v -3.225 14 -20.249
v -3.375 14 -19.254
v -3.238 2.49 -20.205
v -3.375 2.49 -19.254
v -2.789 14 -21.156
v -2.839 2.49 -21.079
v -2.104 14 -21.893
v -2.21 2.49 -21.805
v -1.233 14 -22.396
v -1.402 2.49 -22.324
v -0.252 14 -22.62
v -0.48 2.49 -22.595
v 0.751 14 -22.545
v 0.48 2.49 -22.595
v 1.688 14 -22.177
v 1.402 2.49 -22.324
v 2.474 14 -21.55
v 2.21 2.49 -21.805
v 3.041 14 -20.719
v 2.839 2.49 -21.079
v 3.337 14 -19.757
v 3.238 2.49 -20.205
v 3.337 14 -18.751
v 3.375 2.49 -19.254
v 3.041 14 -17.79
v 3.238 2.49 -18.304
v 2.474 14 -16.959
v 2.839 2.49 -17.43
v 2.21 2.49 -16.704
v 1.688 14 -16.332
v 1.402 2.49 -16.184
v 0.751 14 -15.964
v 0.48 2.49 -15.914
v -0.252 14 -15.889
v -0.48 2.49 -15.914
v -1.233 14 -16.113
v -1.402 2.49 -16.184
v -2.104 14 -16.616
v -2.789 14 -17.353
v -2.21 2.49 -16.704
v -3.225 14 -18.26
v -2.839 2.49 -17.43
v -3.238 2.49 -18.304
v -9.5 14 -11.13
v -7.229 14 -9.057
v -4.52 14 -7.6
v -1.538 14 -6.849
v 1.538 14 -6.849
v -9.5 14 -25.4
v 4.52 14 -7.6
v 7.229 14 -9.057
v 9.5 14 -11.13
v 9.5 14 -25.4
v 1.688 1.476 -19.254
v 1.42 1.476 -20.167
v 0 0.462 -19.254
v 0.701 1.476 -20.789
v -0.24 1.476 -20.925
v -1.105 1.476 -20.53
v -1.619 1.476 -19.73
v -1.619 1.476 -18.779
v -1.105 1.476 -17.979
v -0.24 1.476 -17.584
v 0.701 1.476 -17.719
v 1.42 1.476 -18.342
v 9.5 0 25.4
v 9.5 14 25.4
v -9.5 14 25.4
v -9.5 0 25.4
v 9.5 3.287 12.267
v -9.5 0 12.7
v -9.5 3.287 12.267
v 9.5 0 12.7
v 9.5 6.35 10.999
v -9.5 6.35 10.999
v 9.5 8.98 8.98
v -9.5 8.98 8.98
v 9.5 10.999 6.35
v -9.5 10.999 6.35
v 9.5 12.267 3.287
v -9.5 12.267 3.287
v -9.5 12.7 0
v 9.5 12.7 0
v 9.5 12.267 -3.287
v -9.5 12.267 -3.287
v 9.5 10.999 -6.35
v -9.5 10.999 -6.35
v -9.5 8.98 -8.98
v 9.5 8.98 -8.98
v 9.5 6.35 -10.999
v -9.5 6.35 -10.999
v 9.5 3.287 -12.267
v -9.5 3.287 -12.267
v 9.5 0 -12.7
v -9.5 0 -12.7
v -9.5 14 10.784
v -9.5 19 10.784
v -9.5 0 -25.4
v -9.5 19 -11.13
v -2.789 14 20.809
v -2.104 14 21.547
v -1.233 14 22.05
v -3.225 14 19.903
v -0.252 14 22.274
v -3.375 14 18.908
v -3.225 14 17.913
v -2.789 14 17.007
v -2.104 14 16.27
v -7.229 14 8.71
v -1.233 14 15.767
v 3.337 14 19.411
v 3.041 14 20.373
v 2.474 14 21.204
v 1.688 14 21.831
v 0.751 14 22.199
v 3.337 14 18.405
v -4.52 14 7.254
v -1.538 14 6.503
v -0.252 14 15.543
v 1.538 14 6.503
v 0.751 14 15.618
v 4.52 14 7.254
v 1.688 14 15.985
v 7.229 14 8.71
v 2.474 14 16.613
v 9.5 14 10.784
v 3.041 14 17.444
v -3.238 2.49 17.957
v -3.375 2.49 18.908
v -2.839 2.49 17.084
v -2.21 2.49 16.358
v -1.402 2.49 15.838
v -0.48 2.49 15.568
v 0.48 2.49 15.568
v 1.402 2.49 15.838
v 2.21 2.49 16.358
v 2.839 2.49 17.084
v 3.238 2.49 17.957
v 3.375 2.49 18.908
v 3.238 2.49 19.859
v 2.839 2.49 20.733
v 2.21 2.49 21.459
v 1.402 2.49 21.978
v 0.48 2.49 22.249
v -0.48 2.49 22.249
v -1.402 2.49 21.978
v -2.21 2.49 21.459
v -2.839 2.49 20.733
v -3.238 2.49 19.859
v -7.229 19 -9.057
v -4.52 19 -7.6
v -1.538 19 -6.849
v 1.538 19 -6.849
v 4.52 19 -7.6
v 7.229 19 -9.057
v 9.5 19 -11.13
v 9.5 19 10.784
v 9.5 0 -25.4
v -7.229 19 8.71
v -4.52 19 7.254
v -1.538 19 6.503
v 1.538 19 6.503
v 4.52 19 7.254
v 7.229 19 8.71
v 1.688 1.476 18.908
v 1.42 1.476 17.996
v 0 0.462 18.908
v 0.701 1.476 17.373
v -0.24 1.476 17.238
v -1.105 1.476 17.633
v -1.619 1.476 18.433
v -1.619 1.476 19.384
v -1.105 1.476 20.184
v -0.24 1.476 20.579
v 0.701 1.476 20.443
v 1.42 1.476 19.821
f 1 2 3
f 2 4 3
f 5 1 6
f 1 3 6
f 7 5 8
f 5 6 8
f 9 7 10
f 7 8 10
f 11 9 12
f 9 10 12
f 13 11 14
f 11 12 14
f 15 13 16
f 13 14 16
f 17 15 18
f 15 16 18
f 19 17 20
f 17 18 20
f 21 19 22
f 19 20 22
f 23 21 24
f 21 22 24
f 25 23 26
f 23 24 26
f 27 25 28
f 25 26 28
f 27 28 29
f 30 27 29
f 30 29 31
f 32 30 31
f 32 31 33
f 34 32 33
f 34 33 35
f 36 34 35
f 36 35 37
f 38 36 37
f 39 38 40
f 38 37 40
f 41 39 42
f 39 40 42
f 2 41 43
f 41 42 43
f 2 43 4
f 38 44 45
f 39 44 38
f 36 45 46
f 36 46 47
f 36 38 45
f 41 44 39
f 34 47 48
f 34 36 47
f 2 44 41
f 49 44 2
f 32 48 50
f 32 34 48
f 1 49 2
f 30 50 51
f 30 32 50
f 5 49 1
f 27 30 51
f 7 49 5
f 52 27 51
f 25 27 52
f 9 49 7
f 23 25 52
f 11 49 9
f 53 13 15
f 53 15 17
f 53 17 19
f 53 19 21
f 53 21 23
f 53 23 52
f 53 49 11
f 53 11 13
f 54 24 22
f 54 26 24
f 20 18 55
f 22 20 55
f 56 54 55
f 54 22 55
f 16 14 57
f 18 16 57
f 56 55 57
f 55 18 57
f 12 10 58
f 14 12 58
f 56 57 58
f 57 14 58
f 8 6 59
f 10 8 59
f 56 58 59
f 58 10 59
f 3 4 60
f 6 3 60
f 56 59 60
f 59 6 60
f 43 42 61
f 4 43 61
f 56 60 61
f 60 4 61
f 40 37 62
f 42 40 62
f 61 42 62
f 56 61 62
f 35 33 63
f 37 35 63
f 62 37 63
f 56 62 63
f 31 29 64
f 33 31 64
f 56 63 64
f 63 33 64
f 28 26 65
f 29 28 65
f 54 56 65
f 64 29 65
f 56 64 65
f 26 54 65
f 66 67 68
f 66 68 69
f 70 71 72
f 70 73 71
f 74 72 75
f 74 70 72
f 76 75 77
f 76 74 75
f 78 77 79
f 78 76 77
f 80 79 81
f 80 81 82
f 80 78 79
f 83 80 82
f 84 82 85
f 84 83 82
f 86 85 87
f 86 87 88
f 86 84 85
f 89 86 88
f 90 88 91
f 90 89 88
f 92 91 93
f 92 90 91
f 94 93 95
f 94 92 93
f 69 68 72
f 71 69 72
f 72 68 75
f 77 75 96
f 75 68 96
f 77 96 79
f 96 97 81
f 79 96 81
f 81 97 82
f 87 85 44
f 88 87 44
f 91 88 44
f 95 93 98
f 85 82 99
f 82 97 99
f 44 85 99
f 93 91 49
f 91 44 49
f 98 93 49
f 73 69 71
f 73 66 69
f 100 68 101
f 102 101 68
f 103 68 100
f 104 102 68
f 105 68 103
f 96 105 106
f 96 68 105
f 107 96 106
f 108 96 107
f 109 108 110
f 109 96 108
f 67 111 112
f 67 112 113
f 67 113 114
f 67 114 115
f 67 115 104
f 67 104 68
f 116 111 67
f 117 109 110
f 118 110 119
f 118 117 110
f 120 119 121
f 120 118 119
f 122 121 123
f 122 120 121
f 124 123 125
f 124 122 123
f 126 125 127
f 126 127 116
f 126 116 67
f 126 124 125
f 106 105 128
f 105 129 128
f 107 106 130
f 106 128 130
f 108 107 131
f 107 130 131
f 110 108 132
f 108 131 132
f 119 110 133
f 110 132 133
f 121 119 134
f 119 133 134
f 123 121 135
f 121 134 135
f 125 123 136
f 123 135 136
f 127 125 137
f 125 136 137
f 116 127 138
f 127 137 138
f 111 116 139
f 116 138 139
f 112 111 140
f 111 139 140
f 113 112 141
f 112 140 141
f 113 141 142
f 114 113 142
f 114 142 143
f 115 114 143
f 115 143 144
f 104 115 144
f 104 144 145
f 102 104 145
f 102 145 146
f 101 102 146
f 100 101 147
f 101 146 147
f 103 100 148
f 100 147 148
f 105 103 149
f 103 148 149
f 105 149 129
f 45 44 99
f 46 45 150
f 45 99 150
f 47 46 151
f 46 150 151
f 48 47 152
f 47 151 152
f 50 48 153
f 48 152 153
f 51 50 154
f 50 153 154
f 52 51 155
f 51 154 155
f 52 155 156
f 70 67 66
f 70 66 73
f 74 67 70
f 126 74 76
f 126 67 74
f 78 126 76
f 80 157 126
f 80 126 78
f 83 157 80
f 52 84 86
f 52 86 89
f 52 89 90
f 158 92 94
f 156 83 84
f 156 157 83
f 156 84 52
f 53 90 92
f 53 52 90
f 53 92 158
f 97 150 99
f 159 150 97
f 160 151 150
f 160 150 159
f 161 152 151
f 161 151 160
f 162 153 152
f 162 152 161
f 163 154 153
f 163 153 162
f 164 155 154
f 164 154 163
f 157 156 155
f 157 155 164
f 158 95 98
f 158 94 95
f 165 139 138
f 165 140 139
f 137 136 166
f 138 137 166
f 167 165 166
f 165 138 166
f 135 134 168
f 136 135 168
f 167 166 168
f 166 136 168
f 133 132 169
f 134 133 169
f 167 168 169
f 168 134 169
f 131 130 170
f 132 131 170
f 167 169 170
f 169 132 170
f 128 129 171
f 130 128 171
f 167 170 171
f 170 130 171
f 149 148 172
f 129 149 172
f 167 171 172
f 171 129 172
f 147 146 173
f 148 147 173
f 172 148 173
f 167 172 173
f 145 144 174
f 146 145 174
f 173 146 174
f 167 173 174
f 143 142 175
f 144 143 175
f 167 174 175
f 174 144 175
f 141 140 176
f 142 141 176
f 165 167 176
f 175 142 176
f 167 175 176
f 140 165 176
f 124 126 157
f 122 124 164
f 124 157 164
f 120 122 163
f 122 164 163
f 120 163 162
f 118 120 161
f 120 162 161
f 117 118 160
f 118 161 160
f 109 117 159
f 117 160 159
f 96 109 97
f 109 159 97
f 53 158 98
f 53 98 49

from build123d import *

# Parameters (mm, degrees)
BOSS_EXTRUDE1_DEPTH                           = 9.5
CBORE_FOR_M12_HEX_HEAD_CAP_SCREW1_D           = 6.75
CBORE_FOR_M12_HEX_HEAD_CAP_SCREW1_DEPTH       = 16.51
CBORE_FOR_M12_HEX_HEAD_CAP_SCREW1_CBORE_D     = 25
CBORE_FOR_M12_HEX_HEAD_CAP_SCREW1_CBORE_DEPTH = 5
CBORE_FOR_M12_HEX_HEAD_CAP_SCREW1_TIP         = 2.027904589


with BuildPart() as part:
    # Sketch1 → Boss-Extrude1 (new, symmetric)
    with BuildSketch(Plane(origin=(0, 0, 0), x_dir=(0, 0, -1), z_dir=(1, 0, 0))):
        with BuildLine():
            Line((12.7, 0), (25.4, 0))
            Line((25.4, 0), (25.4, 19))
            Line((25.4, 19), (-25.4, 19))
            Line((-25.4, 19), (-25.4, 0))
            Line((-25.4, 0), (-12.7, 0))
            ThreePointArc((-12.7, 0), (0, 12.7), (12.7, 0))
        make_face()
    extrude(amount=BOSS_EXTRUDE1_DEPTH, both=True)

    # CBORE for M12 Hex Head Cap Screw1
    with Locations(Plane(origin=(0, 19, 0), x_dir=(1, 0, 0), z_dir=(0, 1, 0))):
        with Locations((0, 19.25446783), (0, -18.9082378)):
            CounterBoreHole(CBORE_FOR_M12_HEX_HEAD_CAP_SCREW1_D / 2, CBORE_FOR_M12_HEX_HEAD_CAP_SCREW1_CBORE_D / 2, CBORE_FOR_M12_HEX_HEAD_CAP_SCREW1_CBORE_DEPTH, depth=CBORE_FOR_M12_HEX_HEAD_CAP_SCREW1_DEPTH)
            with Locations((0, 0, -(CBORE_FOR_M12_HEX_HEAD_CAP_SCREW1_DEPTH + CBORE_FOR_M12_HEX_HEAD_CAP_SCREW1_TIP / 2))):  # 118° drill point
                Cone(0, CBORE_FOR_M12_HEX_HEAD_CAP_SCREW1_D / 2, CBORE_FOR_M12_HEX_HEAD_CAP_SCREW1_TIP, mode=Mode.SUBTRACT)


solid = part.part
